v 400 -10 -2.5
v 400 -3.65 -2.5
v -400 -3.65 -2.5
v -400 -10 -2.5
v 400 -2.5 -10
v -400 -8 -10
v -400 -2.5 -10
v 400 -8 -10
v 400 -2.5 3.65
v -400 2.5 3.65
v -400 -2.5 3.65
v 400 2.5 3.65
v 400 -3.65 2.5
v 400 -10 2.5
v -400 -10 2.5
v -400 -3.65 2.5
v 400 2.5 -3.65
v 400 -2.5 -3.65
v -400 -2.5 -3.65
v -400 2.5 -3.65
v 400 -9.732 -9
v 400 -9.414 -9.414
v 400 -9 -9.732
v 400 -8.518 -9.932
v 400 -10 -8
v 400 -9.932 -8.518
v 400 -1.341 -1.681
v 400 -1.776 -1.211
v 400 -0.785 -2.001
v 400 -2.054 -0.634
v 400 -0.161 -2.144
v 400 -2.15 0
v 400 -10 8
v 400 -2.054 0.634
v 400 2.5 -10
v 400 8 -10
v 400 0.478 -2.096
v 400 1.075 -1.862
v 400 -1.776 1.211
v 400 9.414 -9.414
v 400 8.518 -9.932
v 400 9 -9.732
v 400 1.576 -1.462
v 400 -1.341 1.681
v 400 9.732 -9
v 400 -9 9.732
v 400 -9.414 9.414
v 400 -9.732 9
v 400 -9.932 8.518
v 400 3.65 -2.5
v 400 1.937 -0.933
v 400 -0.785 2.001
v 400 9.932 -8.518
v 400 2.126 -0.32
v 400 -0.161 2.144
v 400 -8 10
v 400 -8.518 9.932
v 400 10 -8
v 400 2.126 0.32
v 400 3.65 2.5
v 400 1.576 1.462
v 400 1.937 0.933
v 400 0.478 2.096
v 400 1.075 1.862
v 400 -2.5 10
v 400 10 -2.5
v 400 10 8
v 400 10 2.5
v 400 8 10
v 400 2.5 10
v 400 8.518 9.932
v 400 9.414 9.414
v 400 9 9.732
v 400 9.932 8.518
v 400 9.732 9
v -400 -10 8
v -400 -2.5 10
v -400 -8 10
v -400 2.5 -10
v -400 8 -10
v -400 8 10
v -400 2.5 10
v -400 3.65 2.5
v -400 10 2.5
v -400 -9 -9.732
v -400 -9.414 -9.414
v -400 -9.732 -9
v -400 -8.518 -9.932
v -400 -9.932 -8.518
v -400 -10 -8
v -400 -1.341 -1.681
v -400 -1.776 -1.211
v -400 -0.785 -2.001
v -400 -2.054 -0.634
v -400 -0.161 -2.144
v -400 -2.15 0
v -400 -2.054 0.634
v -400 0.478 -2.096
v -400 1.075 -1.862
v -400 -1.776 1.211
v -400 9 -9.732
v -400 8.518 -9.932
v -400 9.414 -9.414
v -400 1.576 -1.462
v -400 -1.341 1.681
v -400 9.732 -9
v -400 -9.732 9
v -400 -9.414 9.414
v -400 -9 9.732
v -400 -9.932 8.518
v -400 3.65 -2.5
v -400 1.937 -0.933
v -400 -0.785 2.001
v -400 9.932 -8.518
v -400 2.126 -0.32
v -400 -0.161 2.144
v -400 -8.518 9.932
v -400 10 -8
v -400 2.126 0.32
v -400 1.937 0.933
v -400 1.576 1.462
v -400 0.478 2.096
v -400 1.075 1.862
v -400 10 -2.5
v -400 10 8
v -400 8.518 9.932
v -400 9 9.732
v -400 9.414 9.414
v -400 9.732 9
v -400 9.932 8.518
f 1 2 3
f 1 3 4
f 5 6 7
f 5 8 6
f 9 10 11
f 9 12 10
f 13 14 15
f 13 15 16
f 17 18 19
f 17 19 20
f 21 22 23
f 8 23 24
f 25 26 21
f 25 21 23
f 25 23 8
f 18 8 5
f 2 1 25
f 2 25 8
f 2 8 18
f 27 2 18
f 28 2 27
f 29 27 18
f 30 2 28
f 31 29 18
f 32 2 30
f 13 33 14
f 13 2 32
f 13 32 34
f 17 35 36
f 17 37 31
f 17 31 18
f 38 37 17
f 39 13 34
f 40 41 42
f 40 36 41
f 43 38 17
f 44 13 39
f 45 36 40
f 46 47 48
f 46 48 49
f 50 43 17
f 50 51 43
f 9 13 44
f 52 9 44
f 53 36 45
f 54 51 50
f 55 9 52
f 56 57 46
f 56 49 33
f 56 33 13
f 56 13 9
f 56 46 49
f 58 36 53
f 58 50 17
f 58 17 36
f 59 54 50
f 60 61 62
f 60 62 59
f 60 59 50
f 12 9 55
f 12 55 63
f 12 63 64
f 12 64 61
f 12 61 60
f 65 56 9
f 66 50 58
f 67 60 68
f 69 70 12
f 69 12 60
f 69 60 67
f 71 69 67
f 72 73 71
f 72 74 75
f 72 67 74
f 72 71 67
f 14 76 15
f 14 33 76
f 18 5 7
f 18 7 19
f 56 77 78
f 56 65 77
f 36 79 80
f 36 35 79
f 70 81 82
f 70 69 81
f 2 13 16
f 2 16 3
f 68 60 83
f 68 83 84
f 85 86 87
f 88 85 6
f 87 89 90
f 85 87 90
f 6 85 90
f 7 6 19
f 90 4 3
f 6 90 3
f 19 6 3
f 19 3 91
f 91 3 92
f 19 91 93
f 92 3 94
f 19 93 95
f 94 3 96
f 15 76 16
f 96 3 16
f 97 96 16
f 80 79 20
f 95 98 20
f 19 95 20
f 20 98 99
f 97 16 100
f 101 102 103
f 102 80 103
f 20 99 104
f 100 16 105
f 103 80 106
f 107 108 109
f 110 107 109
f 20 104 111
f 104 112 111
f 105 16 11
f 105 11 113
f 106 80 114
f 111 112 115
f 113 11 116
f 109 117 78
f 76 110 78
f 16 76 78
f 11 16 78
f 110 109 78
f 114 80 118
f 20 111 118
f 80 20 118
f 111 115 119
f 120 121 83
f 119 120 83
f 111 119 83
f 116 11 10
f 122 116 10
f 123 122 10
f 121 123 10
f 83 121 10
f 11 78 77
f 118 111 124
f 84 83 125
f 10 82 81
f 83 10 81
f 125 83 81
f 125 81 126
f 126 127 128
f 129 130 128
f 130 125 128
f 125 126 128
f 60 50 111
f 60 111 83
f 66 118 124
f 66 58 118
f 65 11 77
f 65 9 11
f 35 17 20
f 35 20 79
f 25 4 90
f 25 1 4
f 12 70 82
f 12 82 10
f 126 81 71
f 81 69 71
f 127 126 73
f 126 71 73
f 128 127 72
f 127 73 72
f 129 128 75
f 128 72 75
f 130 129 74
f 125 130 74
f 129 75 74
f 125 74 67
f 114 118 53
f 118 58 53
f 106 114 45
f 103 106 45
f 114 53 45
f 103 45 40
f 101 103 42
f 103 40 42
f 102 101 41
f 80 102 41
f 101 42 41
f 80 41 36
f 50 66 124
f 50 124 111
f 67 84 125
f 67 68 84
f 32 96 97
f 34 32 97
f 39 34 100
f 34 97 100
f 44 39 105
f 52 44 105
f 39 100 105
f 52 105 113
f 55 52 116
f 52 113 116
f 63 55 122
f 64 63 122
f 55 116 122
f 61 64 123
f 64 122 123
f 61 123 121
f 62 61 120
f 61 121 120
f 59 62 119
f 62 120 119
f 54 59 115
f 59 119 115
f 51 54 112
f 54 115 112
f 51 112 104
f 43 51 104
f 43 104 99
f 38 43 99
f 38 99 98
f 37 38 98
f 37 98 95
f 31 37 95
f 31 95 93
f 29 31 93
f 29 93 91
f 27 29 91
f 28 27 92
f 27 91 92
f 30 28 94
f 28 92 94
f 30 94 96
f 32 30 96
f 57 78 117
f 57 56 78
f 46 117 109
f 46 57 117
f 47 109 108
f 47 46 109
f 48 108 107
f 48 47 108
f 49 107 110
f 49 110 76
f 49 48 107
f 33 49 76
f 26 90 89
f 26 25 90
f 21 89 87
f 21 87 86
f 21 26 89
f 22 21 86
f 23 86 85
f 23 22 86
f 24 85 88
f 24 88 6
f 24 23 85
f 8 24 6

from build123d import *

# Parameters (mm, degrees)
F1_DEPTH = 400
F2_R     = 2.15
F3_DEPTH = 800
F4_R     = 2


with BuildPart() as f1:
    # F0 (on Right) → F1 (new body, symmetric)
    with BuildSketch(Plane.YZ):
        Polygon((-2.5, 10), (-10, 10), (-10, 2.5), (-3.65, 2.5), (-3.65, -2.5), (-10, -2.5), (-10, -10), (-2.5, -10), (-2.5, -3.65), (2.5, -3.65), (2.5, -10), (10, -10), (10, -2.5), (3.65, -2.5), (3.65, 2.5), (10, 2.5), (10, 10), (2.5, 10), (2.5, 3.65), (-2.5, 3.65), align=None)
    extrude(amount=F1_DEPTH, both=True)

    # F2 (on face) → F3 (cut)
    with BuildSketch(Plane(origin=(-400, 0, 0), x_dir=(0, -1, 0), z_dir=(-1, 0, 0))):
        Circle(F2_R)
    extrude(amount=-F3_DEPTH, mode=Mode.SUBTRACT)

    # F4
    f4_edges = [f1.edges().sort_by_distance(p)[0] for p in [
        (0, 10, -10),
        (0, -10, -10),
        (0, -10, 10),
        (0, 10, 10),
    ]]
    fillet(f4_edges, radius=F4_R)


solid = f1.part
